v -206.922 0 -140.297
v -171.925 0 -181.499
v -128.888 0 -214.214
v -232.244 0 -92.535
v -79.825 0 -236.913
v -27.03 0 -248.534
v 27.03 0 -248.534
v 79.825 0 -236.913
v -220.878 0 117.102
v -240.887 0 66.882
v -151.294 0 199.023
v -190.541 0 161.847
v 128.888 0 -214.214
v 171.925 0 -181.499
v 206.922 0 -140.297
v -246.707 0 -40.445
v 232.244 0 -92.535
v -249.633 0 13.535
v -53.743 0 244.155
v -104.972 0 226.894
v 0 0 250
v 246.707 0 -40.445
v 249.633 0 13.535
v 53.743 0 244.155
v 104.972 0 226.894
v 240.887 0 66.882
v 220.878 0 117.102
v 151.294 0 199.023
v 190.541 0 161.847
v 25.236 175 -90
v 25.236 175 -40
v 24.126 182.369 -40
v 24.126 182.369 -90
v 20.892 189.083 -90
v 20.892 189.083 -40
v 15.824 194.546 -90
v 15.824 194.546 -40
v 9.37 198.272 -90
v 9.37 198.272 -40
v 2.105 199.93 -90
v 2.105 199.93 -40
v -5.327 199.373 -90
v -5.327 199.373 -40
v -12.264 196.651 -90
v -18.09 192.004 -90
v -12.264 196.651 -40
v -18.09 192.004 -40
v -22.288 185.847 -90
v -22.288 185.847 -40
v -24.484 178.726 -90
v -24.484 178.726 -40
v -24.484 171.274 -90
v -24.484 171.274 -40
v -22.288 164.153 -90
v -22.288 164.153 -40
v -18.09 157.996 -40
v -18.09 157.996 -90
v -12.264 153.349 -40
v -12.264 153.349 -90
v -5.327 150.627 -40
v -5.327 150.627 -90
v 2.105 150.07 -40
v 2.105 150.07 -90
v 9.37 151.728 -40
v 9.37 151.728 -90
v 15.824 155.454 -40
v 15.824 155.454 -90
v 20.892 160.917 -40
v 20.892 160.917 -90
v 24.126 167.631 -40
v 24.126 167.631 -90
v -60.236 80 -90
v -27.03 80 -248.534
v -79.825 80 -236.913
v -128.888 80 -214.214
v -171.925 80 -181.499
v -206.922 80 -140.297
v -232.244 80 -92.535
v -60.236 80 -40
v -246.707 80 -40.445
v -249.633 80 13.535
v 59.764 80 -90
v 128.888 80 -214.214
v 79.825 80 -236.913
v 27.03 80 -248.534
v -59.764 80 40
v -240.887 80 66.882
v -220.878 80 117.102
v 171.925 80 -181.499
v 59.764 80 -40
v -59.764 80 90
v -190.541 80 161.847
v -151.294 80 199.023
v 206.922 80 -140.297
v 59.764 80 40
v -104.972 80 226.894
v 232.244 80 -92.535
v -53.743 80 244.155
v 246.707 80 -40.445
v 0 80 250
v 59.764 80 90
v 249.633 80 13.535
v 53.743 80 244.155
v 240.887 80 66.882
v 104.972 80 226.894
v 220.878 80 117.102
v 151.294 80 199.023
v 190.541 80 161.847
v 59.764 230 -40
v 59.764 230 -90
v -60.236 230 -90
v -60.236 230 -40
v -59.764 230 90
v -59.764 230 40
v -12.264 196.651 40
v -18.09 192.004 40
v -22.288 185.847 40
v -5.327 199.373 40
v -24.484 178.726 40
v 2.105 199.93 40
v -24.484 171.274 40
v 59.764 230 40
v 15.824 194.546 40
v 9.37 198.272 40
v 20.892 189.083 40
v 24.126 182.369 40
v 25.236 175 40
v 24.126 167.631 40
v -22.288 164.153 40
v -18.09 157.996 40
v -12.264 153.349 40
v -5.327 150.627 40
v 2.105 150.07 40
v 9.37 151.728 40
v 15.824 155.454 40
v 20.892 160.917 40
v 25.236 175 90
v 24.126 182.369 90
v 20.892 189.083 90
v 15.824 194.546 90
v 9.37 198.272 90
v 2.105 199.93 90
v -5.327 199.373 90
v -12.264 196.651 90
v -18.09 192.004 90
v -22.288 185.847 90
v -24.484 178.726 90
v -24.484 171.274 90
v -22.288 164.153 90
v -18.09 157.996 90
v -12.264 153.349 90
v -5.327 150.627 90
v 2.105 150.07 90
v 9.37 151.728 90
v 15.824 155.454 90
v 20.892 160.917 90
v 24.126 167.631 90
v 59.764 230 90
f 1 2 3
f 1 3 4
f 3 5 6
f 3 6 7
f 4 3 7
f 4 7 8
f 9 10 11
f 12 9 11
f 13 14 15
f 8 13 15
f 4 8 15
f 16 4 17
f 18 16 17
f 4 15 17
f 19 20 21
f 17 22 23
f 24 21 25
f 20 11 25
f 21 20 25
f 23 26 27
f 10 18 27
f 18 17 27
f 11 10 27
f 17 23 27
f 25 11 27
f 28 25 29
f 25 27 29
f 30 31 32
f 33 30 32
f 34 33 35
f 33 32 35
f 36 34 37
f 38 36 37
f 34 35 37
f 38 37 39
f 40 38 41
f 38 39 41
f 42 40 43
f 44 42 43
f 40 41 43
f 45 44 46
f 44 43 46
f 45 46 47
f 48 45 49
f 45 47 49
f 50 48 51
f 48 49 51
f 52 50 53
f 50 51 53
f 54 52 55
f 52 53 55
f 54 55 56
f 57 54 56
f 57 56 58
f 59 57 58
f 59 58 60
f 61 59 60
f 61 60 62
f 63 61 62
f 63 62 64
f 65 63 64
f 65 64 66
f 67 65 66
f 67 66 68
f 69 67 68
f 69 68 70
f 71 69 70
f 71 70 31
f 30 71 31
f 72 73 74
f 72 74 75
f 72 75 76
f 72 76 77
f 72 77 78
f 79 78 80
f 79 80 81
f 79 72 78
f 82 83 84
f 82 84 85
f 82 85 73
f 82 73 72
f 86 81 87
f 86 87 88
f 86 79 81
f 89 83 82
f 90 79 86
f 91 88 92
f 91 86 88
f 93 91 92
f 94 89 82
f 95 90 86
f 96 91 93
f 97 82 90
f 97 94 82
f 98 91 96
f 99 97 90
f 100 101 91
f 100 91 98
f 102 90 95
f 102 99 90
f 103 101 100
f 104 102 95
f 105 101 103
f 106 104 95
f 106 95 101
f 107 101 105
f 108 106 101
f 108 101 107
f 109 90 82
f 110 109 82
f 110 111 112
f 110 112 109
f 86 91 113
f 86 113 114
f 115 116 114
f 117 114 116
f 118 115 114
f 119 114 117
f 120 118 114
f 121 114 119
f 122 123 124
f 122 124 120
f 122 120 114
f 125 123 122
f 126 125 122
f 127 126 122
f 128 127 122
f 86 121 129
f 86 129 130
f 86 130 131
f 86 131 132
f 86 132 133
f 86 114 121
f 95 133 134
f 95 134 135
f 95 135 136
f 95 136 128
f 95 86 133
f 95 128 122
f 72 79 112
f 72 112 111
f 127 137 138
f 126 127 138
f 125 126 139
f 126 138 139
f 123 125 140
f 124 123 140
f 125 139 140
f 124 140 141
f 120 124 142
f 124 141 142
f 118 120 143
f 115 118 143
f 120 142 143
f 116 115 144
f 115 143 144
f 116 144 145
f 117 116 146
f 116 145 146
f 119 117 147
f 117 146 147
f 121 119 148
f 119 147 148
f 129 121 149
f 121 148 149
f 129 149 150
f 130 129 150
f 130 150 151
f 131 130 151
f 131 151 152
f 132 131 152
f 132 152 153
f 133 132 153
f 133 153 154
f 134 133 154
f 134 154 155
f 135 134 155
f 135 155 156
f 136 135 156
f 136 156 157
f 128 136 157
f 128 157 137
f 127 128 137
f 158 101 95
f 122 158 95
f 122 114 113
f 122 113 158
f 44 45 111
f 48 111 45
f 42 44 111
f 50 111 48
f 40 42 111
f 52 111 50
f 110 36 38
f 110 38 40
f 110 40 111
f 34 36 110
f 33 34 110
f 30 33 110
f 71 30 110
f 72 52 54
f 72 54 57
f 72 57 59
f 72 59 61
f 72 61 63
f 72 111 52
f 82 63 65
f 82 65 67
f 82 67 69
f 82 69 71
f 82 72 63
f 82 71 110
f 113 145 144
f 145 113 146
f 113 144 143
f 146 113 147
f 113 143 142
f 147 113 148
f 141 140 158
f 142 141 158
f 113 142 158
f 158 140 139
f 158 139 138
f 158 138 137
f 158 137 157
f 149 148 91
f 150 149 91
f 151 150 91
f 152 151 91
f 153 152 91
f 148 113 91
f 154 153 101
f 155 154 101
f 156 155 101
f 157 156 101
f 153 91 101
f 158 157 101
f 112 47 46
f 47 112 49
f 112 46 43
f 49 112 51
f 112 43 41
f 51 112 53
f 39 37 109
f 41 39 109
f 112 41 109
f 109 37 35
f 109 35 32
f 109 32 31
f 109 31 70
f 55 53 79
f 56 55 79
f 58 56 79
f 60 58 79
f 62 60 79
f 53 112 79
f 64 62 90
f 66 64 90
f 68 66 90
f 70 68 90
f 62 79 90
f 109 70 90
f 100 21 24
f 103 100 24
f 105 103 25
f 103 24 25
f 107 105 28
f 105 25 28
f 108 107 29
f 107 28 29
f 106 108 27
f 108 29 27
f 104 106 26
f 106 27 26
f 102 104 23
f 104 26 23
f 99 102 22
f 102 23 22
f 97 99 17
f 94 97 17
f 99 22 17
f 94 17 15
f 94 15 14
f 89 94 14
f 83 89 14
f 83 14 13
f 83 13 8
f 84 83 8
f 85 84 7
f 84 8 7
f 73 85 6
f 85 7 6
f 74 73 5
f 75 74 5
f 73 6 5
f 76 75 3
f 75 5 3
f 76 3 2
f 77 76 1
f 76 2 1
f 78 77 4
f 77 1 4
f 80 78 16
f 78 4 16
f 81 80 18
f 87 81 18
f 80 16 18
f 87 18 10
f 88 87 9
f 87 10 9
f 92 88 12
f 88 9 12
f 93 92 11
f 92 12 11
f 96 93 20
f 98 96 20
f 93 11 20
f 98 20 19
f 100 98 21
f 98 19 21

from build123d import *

# Parameters (mm, degrees)
SKETCH1_R           = 250
BOSS_EXTRUDE1_DEPTH = 80
SKETCH2_W           = 120
SKETCH2_H           = 50
SKETCH2_W_2         = 119.52714404
BOSS_EXTRUDE2_DEPTH = 150
SKETCH3_R           = 25
CUT_EXTRUDE1_DEPTH  = 481.624593628


with BuildPart() as part:
    # Sketch1 → Boss-Extrude1 (new body)
    with BuildSketch(Plane(origin=(0, 0, 0), x_dir=(1, 0, 0), z_dir=(0, 1, 0))):
        with Locations(Location((0, 0, 0), (0, 0, 270))):
            Circle(SKETCH1_R)
    extrude(amount=BOSS_EXTRUDE1_DEPTH)

    # Sketch2 → Boss-Extrude2 (add)
    with BuildSketch(Plane(origin=(0, 80, 0), x_dir=(1, 0, 0), z_dir=(0, 1, 0))):
        with Locations((-0.23642798, 65)):
            Rectangle(SKETCH2_W, SKETCH2_H)
        with Locations((0, -65)):
            Rectangle(SKETCH2_W_2, SKETCH2_H)
    extrude(amount=BOSS_EXTRUDE2_DEPTH)

    # Sketch3 → Cut-Extrude1 (cut, through all)
    with BuildSketch(Plane.XY.offset(90)):
        with Locations((0.23642798, 175)):
            Circle(SKETCH3_R)
    extrude(amount=-CUT_EXTRUDE1_DEPTH, mode=Mode.SUBTRACT)


solid = part.part
